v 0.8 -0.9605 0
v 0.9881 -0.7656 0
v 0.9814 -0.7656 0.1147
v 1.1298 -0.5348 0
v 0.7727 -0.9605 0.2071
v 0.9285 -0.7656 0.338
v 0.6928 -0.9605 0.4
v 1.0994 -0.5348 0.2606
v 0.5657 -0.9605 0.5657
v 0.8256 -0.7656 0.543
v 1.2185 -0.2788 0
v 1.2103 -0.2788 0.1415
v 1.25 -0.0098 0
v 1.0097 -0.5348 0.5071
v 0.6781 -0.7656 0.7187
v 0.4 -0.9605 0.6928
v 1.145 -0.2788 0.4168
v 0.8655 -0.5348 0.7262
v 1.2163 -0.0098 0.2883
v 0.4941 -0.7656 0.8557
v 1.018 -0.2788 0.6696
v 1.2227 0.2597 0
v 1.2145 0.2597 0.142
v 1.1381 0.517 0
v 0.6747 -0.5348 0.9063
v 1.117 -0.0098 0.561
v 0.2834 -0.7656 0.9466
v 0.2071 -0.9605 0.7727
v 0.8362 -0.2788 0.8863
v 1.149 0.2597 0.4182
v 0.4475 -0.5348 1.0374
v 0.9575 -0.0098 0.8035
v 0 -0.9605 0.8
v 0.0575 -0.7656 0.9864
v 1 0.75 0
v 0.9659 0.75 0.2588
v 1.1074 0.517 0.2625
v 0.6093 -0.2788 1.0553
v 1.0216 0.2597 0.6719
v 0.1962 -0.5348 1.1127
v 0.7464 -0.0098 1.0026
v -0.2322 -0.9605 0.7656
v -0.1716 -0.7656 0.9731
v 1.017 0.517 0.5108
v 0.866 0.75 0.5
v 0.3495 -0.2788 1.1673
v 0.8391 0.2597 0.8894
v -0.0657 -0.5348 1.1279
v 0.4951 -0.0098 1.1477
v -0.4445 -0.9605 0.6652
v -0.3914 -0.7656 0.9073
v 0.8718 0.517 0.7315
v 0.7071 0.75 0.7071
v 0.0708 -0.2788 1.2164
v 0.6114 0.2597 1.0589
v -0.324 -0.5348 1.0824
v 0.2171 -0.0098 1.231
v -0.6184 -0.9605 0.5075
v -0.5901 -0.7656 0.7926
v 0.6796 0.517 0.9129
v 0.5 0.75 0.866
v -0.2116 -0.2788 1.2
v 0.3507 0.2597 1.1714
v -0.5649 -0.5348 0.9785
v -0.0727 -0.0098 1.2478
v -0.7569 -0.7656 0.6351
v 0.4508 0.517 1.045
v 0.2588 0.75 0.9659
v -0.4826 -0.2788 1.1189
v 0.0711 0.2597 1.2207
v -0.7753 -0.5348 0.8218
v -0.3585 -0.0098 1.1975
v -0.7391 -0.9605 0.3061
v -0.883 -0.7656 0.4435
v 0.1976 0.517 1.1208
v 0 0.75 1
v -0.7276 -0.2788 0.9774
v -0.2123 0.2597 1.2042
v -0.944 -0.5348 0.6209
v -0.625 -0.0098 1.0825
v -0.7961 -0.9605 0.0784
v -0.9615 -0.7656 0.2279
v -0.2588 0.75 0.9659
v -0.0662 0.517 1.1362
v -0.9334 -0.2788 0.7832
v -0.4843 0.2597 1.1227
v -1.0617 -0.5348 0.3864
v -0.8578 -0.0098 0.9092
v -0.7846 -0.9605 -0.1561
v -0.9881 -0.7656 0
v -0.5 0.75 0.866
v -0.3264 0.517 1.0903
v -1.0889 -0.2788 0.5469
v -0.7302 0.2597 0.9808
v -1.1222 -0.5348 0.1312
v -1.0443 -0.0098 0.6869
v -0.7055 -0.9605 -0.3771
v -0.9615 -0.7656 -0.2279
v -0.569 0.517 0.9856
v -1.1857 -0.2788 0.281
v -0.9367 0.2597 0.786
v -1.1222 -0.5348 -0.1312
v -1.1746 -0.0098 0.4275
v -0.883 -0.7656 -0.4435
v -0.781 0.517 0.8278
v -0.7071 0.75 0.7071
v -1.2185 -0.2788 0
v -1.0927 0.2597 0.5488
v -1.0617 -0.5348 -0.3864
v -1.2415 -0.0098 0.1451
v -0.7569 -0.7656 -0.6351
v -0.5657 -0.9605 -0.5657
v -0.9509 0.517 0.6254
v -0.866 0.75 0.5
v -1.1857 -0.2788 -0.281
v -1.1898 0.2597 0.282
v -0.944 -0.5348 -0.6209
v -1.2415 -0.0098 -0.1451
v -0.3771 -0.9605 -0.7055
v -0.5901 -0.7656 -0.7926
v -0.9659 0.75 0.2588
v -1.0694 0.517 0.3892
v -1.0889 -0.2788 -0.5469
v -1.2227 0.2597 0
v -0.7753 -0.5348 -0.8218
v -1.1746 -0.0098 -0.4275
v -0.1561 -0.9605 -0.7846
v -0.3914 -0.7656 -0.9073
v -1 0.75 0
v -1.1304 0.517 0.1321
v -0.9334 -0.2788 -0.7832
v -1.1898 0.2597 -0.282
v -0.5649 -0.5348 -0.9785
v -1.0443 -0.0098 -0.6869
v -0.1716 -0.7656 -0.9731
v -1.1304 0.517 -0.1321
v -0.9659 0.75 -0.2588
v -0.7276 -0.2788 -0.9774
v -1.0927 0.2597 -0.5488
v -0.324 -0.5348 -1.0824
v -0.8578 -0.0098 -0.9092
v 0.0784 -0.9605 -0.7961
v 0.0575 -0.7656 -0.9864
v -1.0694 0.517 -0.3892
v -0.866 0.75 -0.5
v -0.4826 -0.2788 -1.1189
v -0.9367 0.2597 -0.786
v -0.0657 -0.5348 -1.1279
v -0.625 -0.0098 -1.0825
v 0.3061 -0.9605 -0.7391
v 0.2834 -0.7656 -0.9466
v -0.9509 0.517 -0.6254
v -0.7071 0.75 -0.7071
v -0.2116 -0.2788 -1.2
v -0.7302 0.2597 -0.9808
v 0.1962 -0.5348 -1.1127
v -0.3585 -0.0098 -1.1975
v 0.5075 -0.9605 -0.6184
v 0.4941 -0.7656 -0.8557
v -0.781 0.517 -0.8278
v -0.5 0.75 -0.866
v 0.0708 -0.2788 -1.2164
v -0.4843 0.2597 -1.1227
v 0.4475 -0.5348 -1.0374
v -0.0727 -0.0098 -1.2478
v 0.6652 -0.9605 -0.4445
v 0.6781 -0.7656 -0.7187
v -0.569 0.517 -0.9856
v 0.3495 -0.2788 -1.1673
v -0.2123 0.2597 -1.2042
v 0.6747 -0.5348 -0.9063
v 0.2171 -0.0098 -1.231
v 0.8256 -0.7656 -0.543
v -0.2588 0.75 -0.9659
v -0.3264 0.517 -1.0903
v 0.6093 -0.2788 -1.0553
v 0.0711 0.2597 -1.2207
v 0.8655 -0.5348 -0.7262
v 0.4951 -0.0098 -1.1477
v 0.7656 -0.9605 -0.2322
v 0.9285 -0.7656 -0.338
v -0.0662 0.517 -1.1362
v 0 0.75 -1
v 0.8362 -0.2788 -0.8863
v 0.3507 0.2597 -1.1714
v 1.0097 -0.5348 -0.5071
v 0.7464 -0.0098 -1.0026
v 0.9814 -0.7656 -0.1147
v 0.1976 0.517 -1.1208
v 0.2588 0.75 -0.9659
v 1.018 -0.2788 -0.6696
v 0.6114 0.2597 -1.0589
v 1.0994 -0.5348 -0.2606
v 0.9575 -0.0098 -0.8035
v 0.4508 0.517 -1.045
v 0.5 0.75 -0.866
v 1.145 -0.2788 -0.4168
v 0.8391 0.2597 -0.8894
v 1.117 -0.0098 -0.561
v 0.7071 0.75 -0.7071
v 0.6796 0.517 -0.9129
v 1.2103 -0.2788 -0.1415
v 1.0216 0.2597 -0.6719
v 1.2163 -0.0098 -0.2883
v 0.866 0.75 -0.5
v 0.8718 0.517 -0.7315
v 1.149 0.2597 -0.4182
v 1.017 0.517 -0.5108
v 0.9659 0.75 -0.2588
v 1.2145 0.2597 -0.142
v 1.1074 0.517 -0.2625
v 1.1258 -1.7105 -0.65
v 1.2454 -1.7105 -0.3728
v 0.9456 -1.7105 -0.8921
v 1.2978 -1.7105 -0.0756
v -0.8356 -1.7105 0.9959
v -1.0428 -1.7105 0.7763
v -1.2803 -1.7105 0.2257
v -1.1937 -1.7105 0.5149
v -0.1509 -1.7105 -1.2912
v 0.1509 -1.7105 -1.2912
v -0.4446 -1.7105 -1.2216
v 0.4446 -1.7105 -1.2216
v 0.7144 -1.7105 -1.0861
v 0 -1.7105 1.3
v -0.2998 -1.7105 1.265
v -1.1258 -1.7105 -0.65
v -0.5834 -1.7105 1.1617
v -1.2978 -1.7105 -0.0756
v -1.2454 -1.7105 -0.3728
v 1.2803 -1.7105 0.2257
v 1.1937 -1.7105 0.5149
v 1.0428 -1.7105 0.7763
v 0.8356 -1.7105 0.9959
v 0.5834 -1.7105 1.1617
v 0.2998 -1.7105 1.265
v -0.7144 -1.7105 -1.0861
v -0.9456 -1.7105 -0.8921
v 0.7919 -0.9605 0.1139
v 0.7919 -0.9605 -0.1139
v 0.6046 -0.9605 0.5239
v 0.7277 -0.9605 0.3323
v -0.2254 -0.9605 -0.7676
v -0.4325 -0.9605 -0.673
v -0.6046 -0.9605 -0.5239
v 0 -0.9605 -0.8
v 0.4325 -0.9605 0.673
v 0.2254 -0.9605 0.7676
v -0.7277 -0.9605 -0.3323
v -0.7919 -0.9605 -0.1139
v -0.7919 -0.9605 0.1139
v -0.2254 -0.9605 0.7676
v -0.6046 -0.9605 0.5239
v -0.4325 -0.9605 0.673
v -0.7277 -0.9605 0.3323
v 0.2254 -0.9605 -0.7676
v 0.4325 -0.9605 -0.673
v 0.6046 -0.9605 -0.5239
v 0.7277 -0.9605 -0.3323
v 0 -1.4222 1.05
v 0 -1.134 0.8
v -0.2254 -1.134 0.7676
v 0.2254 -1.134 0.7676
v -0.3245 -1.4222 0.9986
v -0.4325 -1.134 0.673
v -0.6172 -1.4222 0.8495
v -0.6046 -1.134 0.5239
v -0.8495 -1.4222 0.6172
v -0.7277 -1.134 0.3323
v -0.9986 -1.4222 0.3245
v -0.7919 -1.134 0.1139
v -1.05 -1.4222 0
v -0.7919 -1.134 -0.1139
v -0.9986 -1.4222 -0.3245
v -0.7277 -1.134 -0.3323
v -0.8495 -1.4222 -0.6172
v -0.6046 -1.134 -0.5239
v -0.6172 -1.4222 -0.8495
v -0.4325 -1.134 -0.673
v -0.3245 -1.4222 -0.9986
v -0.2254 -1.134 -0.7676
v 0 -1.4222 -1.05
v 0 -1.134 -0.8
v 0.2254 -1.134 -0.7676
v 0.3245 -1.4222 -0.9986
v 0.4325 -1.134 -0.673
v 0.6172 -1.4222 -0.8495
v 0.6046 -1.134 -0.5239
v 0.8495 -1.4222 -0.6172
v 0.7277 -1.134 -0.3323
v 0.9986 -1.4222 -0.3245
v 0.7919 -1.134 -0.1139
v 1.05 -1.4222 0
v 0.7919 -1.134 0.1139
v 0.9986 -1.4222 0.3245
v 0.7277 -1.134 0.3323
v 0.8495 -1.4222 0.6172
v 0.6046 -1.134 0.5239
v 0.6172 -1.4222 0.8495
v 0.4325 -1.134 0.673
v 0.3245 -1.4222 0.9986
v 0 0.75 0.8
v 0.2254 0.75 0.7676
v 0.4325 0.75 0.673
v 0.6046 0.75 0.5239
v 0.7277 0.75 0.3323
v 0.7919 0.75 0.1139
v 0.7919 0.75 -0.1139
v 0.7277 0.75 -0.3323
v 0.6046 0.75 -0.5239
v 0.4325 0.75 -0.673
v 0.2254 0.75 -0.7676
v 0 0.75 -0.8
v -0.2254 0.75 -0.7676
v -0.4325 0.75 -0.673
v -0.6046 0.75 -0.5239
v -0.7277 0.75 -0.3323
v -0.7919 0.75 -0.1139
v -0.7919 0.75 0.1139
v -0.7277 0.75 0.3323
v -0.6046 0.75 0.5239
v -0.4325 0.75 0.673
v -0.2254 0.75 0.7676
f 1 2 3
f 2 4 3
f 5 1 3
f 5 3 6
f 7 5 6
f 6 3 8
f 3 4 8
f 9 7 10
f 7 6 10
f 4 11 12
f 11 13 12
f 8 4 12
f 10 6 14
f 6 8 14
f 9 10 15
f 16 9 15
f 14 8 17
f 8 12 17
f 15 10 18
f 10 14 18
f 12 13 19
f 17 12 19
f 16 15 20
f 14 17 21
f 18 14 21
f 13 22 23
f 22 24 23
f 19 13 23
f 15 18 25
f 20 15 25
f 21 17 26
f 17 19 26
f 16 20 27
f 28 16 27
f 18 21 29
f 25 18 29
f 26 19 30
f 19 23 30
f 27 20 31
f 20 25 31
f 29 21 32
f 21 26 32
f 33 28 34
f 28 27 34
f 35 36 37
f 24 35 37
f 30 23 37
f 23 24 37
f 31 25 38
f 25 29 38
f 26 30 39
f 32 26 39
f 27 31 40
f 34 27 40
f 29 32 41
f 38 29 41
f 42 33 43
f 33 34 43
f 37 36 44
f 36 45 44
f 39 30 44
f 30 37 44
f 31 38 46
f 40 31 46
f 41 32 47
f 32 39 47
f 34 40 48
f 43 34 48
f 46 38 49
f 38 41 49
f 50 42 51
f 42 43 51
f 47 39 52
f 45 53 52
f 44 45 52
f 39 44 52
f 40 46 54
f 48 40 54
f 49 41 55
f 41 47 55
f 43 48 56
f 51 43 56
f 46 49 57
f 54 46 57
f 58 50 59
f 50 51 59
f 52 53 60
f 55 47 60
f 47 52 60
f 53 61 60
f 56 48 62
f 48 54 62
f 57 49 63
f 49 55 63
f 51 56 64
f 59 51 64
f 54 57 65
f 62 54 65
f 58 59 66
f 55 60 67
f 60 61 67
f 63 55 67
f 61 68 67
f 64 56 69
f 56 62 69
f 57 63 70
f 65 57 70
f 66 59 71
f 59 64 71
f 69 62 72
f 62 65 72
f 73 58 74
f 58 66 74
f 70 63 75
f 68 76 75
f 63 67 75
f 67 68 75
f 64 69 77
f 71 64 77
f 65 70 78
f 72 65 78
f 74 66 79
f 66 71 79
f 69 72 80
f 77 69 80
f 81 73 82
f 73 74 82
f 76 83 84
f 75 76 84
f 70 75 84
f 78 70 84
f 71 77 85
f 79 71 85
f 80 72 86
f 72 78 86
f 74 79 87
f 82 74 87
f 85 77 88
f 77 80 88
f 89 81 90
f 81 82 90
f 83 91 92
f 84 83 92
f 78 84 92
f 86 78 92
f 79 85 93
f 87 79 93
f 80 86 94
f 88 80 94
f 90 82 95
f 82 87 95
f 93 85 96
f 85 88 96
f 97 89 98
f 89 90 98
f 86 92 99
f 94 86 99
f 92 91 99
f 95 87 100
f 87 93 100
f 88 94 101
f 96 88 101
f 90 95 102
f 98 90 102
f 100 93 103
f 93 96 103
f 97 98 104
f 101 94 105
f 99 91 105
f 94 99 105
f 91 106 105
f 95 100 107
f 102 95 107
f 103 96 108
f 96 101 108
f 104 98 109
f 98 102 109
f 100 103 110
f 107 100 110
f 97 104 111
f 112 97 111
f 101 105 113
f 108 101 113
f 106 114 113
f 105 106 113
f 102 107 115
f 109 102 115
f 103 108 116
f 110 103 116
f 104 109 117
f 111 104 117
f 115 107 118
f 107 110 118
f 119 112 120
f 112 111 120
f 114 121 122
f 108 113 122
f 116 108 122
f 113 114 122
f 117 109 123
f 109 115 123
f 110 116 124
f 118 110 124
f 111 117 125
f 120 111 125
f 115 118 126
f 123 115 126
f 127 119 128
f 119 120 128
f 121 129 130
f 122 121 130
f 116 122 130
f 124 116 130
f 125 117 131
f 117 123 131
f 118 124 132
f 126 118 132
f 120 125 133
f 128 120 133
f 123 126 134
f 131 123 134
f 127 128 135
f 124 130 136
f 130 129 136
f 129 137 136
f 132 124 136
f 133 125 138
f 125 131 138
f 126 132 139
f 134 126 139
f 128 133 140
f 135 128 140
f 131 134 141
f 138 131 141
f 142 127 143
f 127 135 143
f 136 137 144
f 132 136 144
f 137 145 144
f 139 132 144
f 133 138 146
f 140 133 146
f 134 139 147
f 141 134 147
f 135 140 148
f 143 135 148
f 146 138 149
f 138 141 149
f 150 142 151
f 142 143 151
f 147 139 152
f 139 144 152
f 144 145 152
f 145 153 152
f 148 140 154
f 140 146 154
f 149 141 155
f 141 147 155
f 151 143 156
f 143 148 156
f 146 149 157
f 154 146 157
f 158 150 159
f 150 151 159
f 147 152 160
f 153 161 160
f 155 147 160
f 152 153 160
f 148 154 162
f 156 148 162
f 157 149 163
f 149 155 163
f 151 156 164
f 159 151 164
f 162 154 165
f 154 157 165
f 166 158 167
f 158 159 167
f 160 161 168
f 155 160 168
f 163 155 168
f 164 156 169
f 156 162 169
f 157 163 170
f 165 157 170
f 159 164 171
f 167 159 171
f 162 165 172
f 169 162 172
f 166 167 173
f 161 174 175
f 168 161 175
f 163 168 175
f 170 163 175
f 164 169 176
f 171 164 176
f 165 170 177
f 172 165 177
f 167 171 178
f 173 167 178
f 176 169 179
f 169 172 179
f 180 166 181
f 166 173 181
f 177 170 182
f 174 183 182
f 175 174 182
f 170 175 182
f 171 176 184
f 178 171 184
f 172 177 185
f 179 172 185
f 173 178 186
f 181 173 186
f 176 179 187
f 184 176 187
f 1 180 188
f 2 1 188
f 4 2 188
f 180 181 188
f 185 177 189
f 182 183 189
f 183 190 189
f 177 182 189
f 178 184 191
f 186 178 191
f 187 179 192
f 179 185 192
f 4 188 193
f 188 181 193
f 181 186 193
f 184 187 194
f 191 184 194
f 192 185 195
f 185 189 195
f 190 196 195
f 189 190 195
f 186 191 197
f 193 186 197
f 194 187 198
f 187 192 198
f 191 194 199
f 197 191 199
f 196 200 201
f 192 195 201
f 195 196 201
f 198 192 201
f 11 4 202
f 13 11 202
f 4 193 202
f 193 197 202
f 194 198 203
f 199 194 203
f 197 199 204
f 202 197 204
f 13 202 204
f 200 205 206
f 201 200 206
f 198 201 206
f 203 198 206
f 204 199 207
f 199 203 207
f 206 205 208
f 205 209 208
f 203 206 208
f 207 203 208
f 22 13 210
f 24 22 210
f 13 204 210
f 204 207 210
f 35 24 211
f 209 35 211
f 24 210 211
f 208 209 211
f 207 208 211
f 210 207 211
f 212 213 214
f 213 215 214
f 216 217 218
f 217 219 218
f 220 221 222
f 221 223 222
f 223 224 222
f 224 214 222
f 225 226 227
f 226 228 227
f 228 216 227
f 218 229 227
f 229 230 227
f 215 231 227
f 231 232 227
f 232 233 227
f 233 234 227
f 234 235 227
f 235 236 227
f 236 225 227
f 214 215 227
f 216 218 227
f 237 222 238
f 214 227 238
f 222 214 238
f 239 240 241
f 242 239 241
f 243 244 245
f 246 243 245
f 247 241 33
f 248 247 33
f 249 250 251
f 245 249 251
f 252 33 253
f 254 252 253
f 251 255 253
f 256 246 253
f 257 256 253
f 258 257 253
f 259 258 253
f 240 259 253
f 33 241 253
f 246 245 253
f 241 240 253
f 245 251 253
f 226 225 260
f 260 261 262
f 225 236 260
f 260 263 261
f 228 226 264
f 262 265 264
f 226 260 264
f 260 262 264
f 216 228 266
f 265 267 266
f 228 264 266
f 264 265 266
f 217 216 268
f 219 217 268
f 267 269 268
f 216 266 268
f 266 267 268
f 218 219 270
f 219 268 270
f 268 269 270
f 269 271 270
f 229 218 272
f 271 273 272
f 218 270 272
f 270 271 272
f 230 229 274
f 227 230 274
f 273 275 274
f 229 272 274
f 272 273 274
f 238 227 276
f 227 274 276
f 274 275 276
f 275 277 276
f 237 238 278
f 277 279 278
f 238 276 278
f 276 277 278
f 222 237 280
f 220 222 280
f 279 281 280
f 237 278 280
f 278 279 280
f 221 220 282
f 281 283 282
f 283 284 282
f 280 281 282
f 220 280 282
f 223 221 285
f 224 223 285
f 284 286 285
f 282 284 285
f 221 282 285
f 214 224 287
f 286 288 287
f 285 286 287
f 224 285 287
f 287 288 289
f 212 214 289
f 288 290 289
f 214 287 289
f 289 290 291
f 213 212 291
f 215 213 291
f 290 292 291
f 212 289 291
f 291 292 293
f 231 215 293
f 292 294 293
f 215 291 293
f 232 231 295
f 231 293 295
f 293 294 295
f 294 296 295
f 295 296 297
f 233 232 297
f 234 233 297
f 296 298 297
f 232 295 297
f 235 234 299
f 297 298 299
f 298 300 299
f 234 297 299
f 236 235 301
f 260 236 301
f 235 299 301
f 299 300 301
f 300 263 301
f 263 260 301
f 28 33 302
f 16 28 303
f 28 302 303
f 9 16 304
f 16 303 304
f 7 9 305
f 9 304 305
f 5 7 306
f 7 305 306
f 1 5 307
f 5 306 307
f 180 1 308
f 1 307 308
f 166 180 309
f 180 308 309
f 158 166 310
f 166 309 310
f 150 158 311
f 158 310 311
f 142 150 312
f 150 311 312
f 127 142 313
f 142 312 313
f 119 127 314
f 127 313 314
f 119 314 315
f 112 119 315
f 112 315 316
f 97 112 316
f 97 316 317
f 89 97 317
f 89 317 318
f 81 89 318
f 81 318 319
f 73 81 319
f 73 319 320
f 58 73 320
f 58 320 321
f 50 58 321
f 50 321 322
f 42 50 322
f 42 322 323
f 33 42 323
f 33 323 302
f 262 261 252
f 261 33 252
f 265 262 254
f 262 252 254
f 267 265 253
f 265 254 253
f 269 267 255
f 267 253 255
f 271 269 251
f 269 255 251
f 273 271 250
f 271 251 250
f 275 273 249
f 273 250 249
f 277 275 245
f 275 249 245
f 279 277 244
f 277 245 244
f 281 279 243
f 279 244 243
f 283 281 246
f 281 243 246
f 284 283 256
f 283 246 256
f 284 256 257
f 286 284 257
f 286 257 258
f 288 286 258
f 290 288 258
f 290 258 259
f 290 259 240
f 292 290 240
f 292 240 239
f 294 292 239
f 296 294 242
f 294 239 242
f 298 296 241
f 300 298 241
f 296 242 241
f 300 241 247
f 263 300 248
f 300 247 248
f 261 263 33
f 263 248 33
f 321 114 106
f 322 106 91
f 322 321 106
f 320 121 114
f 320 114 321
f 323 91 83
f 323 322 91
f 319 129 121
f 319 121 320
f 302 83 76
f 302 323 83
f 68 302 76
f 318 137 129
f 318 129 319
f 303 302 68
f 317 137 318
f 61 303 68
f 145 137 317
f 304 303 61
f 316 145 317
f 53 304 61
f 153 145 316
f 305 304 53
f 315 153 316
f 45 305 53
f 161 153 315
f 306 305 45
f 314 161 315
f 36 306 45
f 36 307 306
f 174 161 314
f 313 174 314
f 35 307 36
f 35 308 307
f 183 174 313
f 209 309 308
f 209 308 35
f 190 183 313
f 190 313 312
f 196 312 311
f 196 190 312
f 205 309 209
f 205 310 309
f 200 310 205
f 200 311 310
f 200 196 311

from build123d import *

# Parameters (mm, degrees)
SKETCH_2_R          = 1.037641751
CUT_EXTRUDE_1_DEPTH = 10
SKETCH_3_R          = 0.8
CUT_EXTRUDE_2_DEPTH = 10


with BuildPart() as part:
    # 草图1 → 旋转1 (revolve)
    with BuildSketch(Plane.XY):
        with BuildLine():
            Line((0, 1.25), (0, -1.25))
            ThreePointArc((0, -1.25), (1.25, 0), (0, 1.25))
        make_face()
    revolve(axis=Axis((0, 1.25, 0), (0, -1, 0)))

    # 草图2 → 切除-拉伸1 (cut)
    with BuildSketch(Plane(origin=(0, 0.75, 0), x_dir=(1, 0, 0), z_dir=(0, 1, 0))):
        Circle(SKETCH_2_R)
    extrude(amount=CUT_EXTRUDE_1_DEPTH, mode=Mode.SUBTRACT)

    # 草图3 → 切除-拉伸2 (cut)
    with BuildSketch(Plane(origin=(0, 0.75, 0), x_dir=(1, 0, 0), z_dir=(0, 1, 0))):
        with Locations(Location((0, 0, 0), (0, 0, 270))):
            Circle(SKETCH_3_R)
    extrude(amount=-CUT_EXTRUDE_2_DEPTH, mode=Mode.SUBTRACT)


with BuildPart() as body_2:
    # 草图4 → 旋转3 (revolve)
    with BuildSketch(Plane(origin=(0, 0, 0), x_dir=(0, 0, -1), z_dir=(1, 0, 0)), mode=Mode.PRIVATE) as revolve_3_sk:
        Polygon((0, -0.960468636), (0, -1.710468636), (1.3, -1.710468636), (0.8, -1.134005887), (0.8, -0.960468636), align=None)
    revolve(revolve_3_sk.sketch.rotate(Axis((0, -0.960468636, 0), (0, -1, 0)), 180), axis=Axis((0, -0.960468636, 0), (0, -1, 0)))


solid = Compound([part.part, body_2.part])
